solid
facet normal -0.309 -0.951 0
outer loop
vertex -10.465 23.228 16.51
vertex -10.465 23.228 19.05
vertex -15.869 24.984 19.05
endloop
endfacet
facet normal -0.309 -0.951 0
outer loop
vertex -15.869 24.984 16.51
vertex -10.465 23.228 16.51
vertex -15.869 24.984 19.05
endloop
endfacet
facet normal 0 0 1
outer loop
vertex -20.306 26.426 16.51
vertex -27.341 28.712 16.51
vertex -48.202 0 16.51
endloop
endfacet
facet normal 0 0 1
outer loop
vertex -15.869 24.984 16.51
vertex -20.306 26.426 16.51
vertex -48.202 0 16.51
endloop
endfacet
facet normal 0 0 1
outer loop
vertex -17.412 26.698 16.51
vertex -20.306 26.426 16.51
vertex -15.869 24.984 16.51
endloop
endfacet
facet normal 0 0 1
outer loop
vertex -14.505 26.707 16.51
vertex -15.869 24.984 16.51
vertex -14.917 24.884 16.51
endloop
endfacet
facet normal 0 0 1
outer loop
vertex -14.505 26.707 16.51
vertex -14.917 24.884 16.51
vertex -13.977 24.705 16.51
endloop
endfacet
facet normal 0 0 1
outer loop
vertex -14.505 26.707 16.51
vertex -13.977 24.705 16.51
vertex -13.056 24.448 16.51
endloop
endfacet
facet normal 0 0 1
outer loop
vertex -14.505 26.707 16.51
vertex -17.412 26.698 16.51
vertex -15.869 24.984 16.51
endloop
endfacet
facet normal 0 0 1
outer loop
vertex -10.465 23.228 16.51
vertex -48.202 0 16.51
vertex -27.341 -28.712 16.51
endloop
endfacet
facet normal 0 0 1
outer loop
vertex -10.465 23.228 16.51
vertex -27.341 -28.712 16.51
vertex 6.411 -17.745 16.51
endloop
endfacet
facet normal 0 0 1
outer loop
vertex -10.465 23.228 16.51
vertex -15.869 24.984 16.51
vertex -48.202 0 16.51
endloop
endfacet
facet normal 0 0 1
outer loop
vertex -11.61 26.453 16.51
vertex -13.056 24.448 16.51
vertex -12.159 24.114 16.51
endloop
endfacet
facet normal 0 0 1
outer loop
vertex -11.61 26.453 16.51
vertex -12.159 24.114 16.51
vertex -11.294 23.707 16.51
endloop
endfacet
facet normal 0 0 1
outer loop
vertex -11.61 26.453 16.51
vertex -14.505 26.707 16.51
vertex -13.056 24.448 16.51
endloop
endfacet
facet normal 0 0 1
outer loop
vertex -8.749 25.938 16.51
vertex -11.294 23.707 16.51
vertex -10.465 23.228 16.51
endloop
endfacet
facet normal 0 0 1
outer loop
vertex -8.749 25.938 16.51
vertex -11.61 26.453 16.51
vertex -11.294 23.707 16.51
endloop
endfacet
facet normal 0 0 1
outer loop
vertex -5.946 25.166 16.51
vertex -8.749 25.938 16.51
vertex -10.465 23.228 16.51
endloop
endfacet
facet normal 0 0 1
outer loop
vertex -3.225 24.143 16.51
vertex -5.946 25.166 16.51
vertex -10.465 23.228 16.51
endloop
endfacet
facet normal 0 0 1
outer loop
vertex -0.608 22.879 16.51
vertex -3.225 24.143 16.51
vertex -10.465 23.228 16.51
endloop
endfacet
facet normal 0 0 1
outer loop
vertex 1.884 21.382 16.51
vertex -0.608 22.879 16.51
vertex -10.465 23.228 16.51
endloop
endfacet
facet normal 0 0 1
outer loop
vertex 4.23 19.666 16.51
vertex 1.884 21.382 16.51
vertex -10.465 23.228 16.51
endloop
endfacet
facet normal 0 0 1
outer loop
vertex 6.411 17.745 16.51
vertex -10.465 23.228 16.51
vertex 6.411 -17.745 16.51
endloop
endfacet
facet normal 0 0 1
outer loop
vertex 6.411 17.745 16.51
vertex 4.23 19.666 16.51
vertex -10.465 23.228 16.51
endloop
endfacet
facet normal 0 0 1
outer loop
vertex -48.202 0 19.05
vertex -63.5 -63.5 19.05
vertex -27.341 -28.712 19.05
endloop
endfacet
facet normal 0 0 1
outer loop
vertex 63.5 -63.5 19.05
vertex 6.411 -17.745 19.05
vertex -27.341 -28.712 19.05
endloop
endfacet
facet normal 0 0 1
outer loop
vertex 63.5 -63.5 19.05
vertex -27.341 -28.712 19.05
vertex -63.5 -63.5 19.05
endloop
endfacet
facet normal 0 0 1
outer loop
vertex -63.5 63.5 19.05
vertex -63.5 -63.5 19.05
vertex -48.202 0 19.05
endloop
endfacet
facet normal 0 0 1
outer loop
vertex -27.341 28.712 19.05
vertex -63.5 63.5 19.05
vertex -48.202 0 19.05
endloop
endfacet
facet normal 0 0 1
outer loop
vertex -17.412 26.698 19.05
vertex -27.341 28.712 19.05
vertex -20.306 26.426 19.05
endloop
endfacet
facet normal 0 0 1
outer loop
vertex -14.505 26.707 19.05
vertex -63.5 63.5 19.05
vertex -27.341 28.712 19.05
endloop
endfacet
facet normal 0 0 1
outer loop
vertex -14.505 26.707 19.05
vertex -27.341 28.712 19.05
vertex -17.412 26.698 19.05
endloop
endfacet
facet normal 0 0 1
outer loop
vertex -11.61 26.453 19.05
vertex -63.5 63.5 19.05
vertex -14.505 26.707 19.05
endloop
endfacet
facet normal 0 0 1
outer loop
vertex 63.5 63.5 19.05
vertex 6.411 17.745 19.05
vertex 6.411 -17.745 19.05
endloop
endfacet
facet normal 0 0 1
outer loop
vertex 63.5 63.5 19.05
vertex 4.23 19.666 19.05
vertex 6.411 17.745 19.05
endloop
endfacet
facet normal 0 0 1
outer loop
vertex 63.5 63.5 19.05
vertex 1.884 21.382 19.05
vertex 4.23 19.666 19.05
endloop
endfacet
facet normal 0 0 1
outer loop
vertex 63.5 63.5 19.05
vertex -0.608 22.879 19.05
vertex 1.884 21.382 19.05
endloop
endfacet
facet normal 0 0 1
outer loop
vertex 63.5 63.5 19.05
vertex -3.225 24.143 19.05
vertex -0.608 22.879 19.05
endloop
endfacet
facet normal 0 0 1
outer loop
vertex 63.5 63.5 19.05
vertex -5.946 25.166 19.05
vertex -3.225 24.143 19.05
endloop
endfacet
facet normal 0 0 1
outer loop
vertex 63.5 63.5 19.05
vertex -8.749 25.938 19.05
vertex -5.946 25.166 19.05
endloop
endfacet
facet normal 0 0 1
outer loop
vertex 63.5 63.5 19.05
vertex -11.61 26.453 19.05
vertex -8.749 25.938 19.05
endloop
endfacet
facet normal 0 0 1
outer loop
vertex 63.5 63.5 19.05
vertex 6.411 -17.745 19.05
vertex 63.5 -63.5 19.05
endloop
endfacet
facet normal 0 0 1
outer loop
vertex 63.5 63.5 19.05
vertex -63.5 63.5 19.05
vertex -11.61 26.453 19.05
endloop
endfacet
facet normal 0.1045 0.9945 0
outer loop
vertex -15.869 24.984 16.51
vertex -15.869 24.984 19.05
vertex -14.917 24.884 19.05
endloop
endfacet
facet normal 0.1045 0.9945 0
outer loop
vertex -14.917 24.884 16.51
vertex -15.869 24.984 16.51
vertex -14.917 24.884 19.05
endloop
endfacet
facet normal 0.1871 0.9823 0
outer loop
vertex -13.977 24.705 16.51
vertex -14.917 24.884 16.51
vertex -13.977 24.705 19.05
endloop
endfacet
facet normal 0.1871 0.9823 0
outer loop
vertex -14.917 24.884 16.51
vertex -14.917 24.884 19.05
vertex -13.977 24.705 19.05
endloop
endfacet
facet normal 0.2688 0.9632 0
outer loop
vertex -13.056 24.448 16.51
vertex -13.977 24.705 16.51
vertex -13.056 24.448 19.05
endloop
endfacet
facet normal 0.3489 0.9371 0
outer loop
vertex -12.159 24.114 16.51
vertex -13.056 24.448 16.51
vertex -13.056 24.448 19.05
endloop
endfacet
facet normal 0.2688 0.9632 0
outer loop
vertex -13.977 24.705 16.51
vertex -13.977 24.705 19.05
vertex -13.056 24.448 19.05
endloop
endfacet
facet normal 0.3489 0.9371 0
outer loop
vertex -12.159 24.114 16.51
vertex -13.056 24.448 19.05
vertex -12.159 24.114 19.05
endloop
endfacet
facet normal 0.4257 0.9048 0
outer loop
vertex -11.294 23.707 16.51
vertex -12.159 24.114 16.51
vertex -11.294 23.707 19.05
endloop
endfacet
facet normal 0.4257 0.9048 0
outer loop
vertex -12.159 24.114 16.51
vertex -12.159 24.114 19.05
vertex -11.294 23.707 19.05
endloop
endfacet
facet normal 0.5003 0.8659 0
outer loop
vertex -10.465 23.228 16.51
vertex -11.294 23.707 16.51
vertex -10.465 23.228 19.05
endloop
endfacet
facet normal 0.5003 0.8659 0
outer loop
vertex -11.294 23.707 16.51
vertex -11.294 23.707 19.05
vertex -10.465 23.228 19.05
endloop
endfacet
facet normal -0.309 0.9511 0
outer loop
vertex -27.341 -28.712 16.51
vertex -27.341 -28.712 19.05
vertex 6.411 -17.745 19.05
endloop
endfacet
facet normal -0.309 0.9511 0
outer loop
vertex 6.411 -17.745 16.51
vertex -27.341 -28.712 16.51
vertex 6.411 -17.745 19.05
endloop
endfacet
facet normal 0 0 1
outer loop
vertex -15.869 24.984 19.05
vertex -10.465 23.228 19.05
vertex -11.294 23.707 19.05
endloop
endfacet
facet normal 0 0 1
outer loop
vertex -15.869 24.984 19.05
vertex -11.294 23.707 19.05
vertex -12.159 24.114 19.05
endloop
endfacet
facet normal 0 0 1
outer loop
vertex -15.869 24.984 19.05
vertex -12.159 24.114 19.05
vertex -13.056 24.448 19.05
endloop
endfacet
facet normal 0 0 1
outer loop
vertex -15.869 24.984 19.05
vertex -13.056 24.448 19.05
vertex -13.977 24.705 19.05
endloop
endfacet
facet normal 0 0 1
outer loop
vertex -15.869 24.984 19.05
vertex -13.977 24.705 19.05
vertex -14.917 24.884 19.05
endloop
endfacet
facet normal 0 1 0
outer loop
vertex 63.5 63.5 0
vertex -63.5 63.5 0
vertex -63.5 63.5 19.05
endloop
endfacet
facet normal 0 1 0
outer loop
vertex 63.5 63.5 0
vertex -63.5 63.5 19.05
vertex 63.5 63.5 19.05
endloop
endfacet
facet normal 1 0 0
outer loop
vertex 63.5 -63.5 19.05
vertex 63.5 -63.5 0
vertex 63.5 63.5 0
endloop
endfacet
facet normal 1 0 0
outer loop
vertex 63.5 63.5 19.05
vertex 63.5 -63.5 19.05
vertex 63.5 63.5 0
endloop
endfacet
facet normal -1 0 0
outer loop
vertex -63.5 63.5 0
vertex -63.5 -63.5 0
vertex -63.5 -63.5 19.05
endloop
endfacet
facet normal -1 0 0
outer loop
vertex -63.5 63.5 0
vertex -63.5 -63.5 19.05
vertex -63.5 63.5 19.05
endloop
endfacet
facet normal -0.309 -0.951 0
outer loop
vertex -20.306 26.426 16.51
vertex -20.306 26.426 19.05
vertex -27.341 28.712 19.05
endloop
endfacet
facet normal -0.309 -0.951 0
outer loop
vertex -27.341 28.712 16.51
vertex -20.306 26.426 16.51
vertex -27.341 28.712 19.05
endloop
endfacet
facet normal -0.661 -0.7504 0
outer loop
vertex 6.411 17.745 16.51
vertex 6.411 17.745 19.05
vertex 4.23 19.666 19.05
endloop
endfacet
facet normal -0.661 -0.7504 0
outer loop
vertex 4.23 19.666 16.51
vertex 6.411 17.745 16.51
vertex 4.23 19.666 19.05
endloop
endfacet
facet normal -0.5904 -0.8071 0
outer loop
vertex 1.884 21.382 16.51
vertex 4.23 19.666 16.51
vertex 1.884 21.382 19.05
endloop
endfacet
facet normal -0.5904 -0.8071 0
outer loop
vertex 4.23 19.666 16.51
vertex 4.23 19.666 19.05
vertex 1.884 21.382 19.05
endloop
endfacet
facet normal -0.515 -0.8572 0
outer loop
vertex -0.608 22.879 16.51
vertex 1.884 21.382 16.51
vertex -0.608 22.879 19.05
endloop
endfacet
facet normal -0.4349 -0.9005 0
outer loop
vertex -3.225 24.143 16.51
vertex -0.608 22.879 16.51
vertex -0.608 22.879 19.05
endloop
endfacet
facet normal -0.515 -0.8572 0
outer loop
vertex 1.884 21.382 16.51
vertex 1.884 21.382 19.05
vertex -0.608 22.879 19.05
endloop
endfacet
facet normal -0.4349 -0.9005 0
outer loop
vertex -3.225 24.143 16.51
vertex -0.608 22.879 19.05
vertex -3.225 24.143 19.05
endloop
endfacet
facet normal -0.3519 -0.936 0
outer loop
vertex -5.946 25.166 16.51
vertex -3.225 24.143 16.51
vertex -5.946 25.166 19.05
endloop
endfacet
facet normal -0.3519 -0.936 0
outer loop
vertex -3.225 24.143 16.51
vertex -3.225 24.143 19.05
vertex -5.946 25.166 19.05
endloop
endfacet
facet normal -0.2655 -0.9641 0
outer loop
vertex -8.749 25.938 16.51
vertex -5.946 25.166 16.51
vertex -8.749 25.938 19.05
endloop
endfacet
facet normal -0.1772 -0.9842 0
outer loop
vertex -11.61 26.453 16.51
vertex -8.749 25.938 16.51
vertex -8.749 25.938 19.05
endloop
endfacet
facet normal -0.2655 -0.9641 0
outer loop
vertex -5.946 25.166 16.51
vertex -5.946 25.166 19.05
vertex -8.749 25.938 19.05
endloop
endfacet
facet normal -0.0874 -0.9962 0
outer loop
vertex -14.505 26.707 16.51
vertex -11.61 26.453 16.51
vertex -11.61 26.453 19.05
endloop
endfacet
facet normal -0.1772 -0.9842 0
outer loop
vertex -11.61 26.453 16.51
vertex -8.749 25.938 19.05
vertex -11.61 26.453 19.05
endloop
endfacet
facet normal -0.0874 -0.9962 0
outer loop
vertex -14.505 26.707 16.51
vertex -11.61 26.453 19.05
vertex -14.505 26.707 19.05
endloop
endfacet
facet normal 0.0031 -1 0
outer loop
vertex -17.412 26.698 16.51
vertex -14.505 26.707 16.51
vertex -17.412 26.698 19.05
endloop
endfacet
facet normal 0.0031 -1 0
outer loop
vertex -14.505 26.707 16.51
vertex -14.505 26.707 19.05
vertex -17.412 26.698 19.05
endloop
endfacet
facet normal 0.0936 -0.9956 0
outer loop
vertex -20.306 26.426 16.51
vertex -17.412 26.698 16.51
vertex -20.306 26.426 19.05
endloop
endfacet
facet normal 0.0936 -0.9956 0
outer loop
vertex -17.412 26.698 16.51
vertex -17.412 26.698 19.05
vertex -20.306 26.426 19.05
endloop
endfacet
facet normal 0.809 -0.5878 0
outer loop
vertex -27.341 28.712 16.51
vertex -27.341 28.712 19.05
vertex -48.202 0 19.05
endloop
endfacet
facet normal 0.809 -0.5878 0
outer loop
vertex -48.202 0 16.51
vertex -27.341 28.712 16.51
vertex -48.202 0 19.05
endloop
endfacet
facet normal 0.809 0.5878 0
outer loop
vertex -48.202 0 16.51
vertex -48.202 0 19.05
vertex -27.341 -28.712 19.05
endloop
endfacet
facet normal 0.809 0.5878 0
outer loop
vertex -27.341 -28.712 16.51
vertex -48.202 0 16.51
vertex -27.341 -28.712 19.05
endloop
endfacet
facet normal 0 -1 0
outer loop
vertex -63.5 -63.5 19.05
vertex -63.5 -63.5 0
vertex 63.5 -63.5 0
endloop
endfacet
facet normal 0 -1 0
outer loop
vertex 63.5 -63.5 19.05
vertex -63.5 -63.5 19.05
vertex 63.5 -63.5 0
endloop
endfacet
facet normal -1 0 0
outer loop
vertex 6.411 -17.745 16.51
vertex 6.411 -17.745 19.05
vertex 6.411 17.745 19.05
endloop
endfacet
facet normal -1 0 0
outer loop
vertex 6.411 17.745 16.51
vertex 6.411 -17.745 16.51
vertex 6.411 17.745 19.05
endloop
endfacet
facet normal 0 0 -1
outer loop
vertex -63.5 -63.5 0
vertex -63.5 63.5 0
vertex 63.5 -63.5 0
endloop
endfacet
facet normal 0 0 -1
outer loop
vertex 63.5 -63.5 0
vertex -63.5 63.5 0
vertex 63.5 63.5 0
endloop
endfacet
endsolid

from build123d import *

# Parameters (mm, degrees)
F0_W     = 127
F0_H     = 127
F1_DEPTH = 19.05
F3_DEPTH = 2.54


with BuildPart() as f1:
    # F0 (on Top) → F1 (new body)
    with BuildSketch(Plane.XY):
        Rectangle(F0_W, F0_H)
    extrude(amount=F1_DEPTH)

    # F2 (on face) → F3 (cut)
    with BuildSketch(Plane.XY.offset(19.05)):
        Polygon((6.411221, -17.744777), (6.411221, 17.744777), (-10.465065, 23.228214), (-15.868622, 24.983937), (-20.305928, 26.425704), (-27.34135, 28.711652), (-48.201586, 0), (-27.34135, -28.711652), align=None)
        with BuildLine():
            Line((-10.465065, 23.228214), (6.411221, 17.744777))
            ThreePointArc((6.411221, 17.744777), (-5.946353, 25.166002), (-20.305928, 26.425704))
            Line((-20.305928, 26.425704), (-15.868622, 24.983937))
            ThreePointArc((-15.868622, 24.983937), (-13.055853, 24.44767), (-10.465065, 23.228214))
        make_face()
    extrude(amount=-F3_DEPTH, mode=Mode.SUBTRACT)


solid = f1.part
